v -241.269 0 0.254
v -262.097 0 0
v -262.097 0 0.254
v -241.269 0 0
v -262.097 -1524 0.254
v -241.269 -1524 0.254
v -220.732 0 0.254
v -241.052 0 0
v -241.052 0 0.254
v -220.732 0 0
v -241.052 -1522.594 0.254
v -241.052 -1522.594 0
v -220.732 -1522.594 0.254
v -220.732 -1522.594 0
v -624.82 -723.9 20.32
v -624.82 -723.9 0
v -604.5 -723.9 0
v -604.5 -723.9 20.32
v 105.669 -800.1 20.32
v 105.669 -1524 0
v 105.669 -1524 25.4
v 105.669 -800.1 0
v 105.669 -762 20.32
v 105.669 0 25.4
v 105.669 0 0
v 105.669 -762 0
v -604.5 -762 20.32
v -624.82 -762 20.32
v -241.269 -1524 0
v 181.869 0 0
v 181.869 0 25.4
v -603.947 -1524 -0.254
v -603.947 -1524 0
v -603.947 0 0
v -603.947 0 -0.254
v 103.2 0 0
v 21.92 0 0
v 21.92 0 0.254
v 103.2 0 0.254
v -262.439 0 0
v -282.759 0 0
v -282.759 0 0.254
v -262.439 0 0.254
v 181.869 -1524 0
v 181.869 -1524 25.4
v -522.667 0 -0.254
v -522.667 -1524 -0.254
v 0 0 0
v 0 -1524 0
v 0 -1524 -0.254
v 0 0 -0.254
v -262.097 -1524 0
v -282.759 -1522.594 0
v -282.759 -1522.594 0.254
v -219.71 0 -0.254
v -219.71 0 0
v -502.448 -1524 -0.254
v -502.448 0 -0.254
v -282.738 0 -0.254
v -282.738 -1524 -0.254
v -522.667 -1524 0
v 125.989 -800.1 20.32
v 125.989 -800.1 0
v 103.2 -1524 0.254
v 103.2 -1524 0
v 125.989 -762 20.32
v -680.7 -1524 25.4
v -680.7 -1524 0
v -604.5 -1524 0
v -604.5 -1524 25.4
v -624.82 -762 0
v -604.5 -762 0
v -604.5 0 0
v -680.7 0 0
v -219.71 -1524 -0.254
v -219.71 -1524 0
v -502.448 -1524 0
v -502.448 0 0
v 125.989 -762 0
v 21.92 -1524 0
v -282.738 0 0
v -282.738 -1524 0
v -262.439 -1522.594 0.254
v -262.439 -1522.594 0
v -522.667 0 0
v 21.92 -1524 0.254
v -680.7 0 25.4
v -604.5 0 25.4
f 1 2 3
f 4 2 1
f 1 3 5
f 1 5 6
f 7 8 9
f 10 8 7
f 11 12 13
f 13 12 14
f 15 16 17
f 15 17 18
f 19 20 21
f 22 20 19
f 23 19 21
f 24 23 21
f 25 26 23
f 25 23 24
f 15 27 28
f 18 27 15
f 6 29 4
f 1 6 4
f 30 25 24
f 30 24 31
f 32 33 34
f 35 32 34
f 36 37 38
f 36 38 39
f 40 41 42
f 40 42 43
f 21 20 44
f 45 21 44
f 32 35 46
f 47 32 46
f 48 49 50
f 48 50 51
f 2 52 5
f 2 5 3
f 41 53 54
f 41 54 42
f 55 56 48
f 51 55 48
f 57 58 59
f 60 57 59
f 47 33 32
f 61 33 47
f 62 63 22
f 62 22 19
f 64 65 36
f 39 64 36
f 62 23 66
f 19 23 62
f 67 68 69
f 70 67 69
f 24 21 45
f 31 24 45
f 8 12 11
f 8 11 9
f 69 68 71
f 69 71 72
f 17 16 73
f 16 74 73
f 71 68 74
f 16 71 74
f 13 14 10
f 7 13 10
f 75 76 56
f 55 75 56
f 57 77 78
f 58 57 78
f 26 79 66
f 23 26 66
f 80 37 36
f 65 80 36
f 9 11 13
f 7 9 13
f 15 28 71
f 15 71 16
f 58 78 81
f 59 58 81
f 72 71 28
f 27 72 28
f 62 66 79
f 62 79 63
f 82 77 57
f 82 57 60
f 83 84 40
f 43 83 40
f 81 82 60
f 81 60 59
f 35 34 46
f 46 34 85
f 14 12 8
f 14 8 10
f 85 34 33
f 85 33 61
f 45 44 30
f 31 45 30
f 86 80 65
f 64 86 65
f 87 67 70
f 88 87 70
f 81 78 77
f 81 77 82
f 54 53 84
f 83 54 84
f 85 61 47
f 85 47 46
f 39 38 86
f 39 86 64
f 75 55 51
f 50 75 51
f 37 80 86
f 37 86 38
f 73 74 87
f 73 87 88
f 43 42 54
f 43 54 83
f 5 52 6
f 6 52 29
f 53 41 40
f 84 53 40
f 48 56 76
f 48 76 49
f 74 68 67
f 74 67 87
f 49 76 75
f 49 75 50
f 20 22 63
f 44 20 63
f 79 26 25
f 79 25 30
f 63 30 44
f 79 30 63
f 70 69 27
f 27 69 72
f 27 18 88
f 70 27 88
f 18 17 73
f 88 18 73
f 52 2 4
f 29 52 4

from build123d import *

# Parameters (mm, degrees)
F2_W      = 76.2
F2_H      = 1524
F3_DEPTH  = 25.4
F4_W      = 38.1
F4_H      = 20.32
F5_DEPTH  = 20.32
F6_W      = 38.1
F6_H      = 20.32
F7_DEPTH  = 20.32
F0_W      = 219.71
F0_H      = 1524
F8_DEPTH  = 0.254
F1_W      = 81.28
F1_H      = 1524
F9_DEPTH  = 0.254
F10_W     = 81.28
F10_H     = 1524
F11_DEPTH = 0.254
F12_W     = 20.32
F12_H     = 1522.59439733
F13_DEPTH = 0.254
F14_W     = 20.828
F14_H     = 1524
F15_DEPTH = 0.254


with BuildPart() as f3:
    # F2 (on Top) → F3 (new body)
    with BuildSketch(Plane.XY):
        with Locations((143.7694760919, -762)):
            Rectangle(F2_W, F2_H)
    extrude(amount=F3_DEPTH)

    # F6 (on face) → F7 (cut)
    with BuildSketch(Plane(origin=(105.6694760919, 0, 0), x_dir=(0, -1, 0), z_dir=(-1, 0, 0))):
        with Locations((781.05, 10.16)):
            Rectangle(F6_W, F6_H)
    extrude(amount=-F7_DEPTH, mode=Mode.SUBTRACT)


with BuildPart() as f3b:
    # F2 (on Top) → F3, piece 2 (new body)
    with BuildSketch(Plane.XY):
        with Locations((-642.599578476, -762)):
            Rectangle(F2_W, F2_H)
    extrude(amount=F3_DEPTH)

    # F4 (on face) → F5 (cut)
    with BuildSketch(Plane.YZ.offset(-604.499578476)):
        with Locations((-742.95, 10.16)):
            Rectangle(F4_W, F4_H)
    extrude(amount=-F5_DEPTH, mode=Mode.SUBTRACT)


with BuildPart() as f8:
    # F0 (on Top) → F8 (new body)
    with BuildSketch(Plane.XY):
        with Locations((-109.855, -762)):
            Rectangle(F0_W, F0_H)
    extrude(amount=-F8_DEPTH)


with BuildPart() as f8b:
    # F0 (on Top) → F8, piece 2 (new body)
    with BuildSketch(Plane.XY):
        with Locations((-392.5929627609, -762)):
            Rectangle(F0_W, F0_H)
    extrude(amount=-F8_DEPTH)


with BuildPart() as f9:
    # F1 (on Top) → F9 (new body)
    with BuildSketch(Plane.XY):
        with Locations((-563.3068715477, -762)):
            Rectangle(F1_W, F1_H)
    extrude(amount=-F9_DEPTH)


with BuildPart() as f11:
    # F10 (on Top) → F11 (new body)
    with BuildSketch(Plane.XY):
        with Locations((62.5596027889, -762)):
            Rectangle(F10_W, F10_H)
    extrude(amount=F11_DEPTH)


with BuildPart() as f13:
    # F12 (on Top) → F13 (new body)
    with BuildSketch(Plane.XY):
        with Locations((-272.5990045506, -761.297198665)):
            Rectangle(F12_W, F12_H)
    extrude(amount=F13_DEPTH)


with BuildPart() as f13b:
    # F12 (on Top) → F13, piece 2 (new body)
    with BuildSketch(Plane.XY):
        with Locations((-230.8922045506, -761.297198665)):
            Rectangle(F12_W, F12_H)
    extrude(amount=F13_DEPTH)


with BuildPart() as f15:
    # F14 (on Top) → F15 (new body)
    with BuildSketch(Plane.XY):
        with Locations((-251.6828285112, -762)):
            Rectangle(F14_W, F14_H)
    extrude(amount=F15_DEPTH)


solid = Compound([f3.part, f3b.part, f8.part, f8b.part, f9.part, f11.part, f13.part, f13b.part, f15.part])
